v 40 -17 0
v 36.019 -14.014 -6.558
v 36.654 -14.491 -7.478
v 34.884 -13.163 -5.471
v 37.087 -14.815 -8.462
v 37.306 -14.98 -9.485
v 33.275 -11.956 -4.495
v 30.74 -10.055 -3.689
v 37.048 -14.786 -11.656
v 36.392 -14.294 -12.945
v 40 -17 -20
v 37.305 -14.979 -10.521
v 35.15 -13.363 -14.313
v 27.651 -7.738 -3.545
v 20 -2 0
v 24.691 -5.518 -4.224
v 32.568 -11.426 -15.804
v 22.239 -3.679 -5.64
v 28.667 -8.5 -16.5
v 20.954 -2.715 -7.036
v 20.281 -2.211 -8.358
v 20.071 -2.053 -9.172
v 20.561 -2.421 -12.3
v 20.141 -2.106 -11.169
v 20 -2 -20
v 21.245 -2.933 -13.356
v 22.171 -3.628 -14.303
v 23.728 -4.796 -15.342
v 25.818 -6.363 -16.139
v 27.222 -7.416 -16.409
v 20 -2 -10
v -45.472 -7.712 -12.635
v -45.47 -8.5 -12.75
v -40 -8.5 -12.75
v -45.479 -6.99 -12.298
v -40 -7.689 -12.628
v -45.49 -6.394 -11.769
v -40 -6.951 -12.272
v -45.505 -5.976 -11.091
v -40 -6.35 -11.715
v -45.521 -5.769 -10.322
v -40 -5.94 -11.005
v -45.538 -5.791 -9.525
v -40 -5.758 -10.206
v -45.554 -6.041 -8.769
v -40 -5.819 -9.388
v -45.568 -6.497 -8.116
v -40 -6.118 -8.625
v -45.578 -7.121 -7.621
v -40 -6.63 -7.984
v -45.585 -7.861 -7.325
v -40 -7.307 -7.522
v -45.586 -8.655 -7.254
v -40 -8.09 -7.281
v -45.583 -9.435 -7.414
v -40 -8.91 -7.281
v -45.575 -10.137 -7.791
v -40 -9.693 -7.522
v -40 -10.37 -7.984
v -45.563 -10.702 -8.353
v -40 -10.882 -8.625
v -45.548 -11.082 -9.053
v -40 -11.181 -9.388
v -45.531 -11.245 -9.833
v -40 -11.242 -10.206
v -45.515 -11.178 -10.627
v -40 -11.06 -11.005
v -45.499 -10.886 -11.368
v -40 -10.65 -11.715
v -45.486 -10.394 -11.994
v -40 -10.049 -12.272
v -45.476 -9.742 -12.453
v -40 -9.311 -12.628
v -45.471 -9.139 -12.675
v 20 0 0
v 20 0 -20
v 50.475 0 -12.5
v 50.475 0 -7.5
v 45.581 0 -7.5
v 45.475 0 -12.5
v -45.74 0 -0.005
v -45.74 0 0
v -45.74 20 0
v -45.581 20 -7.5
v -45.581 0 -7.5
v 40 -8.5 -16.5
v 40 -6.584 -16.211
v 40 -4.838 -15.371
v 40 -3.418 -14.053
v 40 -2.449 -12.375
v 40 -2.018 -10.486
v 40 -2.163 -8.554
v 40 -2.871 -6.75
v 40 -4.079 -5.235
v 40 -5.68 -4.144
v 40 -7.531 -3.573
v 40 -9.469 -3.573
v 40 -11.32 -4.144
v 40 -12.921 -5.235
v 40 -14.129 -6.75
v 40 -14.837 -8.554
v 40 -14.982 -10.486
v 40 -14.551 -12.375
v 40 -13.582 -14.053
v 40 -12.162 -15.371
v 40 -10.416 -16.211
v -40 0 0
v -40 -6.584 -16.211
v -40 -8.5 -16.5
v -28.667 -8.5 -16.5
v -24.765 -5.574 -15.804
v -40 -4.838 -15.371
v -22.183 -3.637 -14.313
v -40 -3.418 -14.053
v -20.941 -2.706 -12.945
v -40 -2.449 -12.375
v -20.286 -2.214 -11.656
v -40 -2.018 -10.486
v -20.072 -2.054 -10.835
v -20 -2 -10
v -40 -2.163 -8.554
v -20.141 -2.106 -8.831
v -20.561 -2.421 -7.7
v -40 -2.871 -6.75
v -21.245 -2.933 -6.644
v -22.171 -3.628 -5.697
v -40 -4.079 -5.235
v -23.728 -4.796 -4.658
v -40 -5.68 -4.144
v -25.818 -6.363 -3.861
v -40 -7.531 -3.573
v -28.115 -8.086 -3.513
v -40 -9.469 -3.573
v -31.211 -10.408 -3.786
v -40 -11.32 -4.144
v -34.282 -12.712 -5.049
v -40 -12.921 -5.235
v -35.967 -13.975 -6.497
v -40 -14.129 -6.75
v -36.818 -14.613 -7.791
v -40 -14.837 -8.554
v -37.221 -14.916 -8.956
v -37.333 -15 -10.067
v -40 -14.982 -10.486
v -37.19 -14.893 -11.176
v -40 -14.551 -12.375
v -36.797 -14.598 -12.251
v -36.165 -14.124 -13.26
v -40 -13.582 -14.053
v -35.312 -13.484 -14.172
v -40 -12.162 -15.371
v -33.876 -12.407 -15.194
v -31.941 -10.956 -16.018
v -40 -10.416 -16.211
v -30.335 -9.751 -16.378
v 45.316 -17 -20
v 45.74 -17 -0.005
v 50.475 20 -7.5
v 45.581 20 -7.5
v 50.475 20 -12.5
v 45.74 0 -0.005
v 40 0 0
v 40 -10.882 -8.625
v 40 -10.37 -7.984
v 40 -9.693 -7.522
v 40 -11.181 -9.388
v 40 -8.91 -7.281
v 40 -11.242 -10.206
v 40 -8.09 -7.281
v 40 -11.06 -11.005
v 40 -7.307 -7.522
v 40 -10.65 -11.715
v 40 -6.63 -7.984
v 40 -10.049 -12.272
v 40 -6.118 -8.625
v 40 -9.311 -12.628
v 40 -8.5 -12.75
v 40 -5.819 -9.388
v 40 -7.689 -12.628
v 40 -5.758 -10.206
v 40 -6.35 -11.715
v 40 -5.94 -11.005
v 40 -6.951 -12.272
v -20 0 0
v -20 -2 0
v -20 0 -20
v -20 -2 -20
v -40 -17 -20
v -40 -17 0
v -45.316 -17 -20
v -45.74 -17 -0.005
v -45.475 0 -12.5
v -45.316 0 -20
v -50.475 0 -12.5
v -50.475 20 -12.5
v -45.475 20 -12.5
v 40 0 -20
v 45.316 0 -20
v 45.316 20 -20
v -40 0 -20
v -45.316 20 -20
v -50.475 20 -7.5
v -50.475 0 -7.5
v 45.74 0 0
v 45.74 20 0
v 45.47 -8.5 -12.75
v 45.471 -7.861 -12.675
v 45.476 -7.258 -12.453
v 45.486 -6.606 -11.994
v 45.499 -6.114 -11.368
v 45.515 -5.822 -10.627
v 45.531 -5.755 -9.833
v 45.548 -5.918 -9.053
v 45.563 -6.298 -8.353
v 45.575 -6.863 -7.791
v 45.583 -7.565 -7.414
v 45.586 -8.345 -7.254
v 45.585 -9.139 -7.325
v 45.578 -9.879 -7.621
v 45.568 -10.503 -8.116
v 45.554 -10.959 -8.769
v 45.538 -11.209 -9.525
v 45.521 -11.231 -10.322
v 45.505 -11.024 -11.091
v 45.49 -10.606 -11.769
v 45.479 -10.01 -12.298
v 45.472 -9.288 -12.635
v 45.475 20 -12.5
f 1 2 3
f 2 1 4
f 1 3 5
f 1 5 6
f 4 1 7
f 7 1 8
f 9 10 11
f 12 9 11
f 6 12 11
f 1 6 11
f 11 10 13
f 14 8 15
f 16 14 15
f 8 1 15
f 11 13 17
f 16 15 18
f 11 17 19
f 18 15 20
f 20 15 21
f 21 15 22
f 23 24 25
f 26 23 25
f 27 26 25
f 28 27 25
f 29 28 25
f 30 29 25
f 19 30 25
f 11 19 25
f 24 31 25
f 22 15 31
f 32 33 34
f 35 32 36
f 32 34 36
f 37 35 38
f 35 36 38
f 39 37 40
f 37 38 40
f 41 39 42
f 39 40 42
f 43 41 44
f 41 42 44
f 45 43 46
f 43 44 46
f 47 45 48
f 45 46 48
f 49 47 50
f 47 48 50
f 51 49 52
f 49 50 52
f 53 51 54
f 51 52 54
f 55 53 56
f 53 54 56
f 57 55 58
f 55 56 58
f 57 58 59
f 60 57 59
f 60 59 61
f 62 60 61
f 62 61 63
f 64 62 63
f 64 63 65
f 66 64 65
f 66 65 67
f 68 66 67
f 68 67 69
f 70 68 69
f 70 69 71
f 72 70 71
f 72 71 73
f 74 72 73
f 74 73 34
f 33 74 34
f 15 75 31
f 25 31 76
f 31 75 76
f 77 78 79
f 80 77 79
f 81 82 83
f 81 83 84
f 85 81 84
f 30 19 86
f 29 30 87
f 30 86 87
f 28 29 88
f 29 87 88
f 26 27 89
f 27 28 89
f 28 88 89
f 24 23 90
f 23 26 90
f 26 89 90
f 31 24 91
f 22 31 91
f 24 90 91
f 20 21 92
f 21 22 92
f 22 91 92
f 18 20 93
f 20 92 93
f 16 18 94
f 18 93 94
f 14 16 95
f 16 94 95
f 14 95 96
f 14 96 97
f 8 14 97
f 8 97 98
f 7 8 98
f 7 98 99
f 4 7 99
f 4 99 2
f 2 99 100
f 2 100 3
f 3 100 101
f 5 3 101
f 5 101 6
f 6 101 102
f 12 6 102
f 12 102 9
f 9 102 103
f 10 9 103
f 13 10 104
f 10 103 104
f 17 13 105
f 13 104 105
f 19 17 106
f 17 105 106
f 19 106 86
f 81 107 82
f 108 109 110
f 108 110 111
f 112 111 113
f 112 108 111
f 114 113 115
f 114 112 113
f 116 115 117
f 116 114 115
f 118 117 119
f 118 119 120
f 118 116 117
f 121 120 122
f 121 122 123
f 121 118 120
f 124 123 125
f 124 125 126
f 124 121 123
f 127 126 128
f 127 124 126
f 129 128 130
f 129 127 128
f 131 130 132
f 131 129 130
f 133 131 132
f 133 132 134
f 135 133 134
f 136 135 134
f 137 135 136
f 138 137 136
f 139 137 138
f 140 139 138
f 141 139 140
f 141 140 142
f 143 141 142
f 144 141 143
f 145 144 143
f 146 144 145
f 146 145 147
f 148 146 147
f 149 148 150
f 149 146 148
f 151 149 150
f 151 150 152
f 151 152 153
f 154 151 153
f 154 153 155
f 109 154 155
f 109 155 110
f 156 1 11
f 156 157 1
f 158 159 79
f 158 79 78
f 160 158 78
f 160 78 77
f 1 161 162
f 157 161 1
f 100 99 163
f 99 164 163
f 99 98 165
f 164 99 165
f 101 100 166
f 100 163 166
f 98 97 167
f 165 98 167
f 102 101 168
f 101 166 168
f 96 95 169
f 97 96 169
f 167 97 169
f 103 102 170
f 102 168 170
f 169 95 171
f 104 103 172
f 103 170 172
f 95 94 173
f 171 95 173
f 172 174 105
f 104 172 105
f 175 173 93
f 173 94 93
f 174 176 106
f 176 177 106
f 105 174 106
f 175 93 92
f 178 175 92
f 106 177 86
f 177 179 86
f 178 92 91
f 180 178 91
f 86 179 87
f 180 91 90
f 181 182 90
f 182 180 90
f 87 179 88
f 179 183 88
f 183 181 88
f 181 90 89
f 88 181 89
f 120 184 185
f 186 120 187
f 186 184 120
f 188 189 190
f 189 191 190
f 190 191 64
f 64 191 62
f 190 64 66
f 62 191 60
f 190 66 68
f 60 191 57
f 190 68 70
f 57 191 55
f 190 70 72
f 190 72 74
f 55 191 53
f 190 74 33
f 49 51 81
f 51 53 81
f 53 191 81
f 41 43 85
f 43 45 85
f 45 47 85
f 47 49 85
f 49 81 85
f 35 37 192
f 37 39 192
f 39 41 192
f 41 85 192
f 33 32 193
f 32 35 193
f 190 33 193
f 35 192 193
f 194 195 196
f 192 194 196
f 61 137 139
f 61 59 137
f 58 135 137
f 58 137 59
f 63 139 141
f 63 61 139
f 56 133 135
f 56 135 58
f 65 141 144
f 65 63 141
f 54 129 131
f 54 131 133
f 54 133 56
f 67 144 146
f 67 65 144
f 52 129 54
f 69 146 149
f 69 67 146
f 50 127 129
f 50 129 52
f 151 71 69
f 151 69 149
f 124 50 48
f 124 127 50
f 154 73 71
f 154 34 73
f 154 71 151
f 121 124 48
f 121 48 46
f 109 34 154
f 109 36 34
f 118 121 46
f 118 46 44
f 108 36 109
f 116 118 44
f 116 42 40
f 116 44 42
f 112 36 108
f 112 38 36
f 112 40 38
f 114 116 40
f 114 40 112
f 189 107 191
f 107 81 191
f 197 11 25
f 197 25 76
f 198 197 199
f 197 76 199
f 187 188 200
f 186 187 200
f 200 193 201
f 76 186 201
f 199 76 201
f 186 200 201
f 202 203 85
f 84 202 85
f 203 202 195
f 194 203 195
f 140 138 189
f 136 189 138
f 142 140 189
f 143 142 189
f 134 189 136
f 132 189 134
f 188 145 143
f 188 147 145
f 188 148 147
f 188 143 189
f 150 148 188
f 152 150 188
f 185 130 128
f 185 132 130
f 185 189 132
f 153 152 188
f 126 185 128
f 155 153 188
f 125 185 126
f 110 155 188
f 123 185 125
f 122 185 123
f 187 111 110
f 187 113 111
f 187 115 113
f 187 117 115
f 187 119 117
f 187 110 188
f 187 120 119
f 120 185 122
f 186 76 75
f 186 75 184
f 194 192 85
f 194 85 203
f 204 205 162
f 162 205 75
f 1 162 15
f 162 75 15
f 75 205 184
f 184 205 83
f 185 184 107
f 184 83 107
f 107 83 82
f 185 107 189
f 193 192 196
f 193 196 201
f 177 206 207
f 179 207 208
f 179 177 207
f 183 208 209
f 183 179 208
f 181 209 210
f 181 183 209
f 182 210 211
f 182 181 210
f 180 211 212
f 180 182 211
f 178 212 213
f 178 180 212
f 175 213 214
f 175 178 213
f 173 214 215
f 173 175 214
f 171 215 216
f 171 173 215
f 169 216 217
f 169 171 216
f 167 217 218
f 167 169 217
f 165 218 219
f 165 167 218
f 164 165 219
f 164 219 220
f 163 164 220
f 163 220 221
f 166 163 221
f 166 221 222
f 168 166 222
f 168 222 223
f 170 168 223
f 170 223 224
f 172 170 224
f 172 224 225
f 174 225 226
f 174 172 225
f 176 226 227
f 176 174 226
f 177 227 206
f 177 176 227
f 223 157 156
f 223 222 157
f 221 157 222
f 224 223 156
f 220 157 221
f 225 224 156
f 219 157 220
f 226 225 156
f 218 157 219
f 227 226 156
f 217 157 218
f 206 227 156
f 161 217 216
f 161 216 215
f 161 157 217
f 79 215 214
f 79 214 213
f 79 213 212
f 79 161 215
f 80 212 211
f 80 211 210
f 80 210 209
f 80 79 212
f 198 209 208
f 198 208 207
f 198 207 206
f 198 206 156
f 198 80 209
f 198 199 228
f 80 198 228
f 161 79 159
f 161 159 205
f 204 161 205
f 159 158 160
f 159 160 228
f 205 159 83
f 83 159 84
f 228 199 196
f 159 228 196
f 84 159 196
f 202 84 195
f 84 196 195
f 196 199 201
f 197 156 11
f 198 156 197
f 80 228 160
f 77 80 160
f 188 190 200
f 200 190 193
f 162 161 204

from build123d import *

# Parameters (mm, degrees)
BOSS_EXTRUDE1_DEPTH = 20
SKETCH2_W           = 5
SKETCH2_H           = 5
BOSS_EXTRUDE2_DEPTH = 20
SKETCH4_W           = 20
SKETCH4_H           = 17
SKETCH3_W           = 19.999551015
SKETCH3_H           = 17
SKETCH6_W           = 20
SKETCH6_H           = 17
SKETCH5_W           = 20
SKETCH5_H           = 2
SKETCH7_R           = 2.75
CUT_EXTRUDE1_DEPTH  = 11.47488838
SKETCH8_R           = 6.5
CUT_EXTRUDE2_DEPTH  = 30


with BuildPart() as part:
    # Sketch1 → Boss-Extrude1 (new body)
    with BuildSketch(Plane(origin=(0, 0, 0), x_dir=(1, 0, 0), z_dir=(0, 1, 0))):
        Polygon((-45.74, 0), (-45.315821408, 20), (45.315821408, 20), (45.74, 0), align=None)
    extrude(amount=BOSS_EXTRUDE1_DEPTH)

    # Sketch2 → Boss-Extrude2 (add)
    with BuildSketch(Plane(origin=(0, 20, 0), x_dir=(1, 0, 0), z_dir=(0, 1, 0))):
        with Locations((47.97488838, 10)):
            Rectangle(SKETCH2_W, SKETCH2_H)
        with Locations((-47.97488838, 10)):
            Rectangle(SKETCH2_W, SKETCH2_H)
    extrude(amount=-BOSS_EXTRUDE2_DEPTH)

    # Sketch4 → Loft1 section 0
    with BuildSketch(Plane(origin=(-40, 0, 0), x_dir=(0, 0, -1), z_dir=(1, 0, 0))):
        with Locations((10, -8.5)):
            Rectangle(SKETCH4_W, SKETCH4_H)
    # Sketch3 → Loft1 section 1
    with BuildSketch(Plane(origin=(-45.719434544, 0, -0.969660269), x_dir=(-0.021204161, 0, 0.999775167), z_dir=(-0.999775167, 0, -0.021204161))):
        with Locations((-9.034843843, -8.5)):
            Rectangle(SKETCH3_W, SKETCH3_H)
    loft1 = loft()

    # Sketch6 → Loft3 section 0
    with BuildSketch(Plane(origin=(-40, 0, 0), x_dir=(0, 0, -1), z_dir=(1, 0, 0))):
        with Locations((10, -8.5)):
            Rectangle(SKETCH6_W, SKETCH6_H)
    # Sketch5 → Loft3 section 1
    with BuildSketch(Plane(origin=(-20, 0, 0), x_dir=(0, 0, -1), z_dir=(1, 0, 0))):
        with Locations((10, -1)):
            Rectangle(SKETCH5_W, SKETCH5_H)
    loft3 = loft()

    # Sketch7 → Cut-Extrude1 (cut, through all)
    with BuildSketch(Plane(origin=(-40, 0, 0), x_dir=(0, 0, -1), z_dir=(1, 0, 0))):
        with Locations((10, -8.5)):
            Circle(SKETCH7_R)
    cut_extrude1 = extrude(amount=-CUT_EXTRUDE1_DEPTH, mode=Mode.SUBTRACT)

    # Sketch8 → Cut-Extrude2 (cut)
    with BuildSketch(Plane(origin=(-40, 0, 0), x_dir=(0, 0, -1), z_dir=(1, 0, 0))):
        with Locations((10, -8.5)):
            Circle(SKETCH8_R)
    cut_extrude2 = extrude(amount=CUT_EXTRUDE2_DEPTH, mode=Mode.SUBTRACT)

    # Mirror1: Loft1, Loft3, Cut-Extrude1, Cut-Extrude2 across plane
    add(loft1.mirror(Plane(origin=(0, 0, 0), x_dir=(0, 0, 1), z_dir=(1, 0, 0))))
    add(loft3.mirror(Plane(origin=(0, 0, 0), x_dir=(0, 0, 1), z_dir=(1, 0, 0))))
    add(cut_extrude1.mirror(Plane(origin=(0, 0, 0), x_dir=(0, 0, 1), z_dir=(1, 0, 0))), mode=Mode.SUBTRACT)
    add(cut_extrude2.mirror(Plane(origin=(0, 0, 0), x_dir=(0, 0, 1), z_dir=(1, 0, 0))), mode=Mode.SUBTRACT)


solid = part.part
